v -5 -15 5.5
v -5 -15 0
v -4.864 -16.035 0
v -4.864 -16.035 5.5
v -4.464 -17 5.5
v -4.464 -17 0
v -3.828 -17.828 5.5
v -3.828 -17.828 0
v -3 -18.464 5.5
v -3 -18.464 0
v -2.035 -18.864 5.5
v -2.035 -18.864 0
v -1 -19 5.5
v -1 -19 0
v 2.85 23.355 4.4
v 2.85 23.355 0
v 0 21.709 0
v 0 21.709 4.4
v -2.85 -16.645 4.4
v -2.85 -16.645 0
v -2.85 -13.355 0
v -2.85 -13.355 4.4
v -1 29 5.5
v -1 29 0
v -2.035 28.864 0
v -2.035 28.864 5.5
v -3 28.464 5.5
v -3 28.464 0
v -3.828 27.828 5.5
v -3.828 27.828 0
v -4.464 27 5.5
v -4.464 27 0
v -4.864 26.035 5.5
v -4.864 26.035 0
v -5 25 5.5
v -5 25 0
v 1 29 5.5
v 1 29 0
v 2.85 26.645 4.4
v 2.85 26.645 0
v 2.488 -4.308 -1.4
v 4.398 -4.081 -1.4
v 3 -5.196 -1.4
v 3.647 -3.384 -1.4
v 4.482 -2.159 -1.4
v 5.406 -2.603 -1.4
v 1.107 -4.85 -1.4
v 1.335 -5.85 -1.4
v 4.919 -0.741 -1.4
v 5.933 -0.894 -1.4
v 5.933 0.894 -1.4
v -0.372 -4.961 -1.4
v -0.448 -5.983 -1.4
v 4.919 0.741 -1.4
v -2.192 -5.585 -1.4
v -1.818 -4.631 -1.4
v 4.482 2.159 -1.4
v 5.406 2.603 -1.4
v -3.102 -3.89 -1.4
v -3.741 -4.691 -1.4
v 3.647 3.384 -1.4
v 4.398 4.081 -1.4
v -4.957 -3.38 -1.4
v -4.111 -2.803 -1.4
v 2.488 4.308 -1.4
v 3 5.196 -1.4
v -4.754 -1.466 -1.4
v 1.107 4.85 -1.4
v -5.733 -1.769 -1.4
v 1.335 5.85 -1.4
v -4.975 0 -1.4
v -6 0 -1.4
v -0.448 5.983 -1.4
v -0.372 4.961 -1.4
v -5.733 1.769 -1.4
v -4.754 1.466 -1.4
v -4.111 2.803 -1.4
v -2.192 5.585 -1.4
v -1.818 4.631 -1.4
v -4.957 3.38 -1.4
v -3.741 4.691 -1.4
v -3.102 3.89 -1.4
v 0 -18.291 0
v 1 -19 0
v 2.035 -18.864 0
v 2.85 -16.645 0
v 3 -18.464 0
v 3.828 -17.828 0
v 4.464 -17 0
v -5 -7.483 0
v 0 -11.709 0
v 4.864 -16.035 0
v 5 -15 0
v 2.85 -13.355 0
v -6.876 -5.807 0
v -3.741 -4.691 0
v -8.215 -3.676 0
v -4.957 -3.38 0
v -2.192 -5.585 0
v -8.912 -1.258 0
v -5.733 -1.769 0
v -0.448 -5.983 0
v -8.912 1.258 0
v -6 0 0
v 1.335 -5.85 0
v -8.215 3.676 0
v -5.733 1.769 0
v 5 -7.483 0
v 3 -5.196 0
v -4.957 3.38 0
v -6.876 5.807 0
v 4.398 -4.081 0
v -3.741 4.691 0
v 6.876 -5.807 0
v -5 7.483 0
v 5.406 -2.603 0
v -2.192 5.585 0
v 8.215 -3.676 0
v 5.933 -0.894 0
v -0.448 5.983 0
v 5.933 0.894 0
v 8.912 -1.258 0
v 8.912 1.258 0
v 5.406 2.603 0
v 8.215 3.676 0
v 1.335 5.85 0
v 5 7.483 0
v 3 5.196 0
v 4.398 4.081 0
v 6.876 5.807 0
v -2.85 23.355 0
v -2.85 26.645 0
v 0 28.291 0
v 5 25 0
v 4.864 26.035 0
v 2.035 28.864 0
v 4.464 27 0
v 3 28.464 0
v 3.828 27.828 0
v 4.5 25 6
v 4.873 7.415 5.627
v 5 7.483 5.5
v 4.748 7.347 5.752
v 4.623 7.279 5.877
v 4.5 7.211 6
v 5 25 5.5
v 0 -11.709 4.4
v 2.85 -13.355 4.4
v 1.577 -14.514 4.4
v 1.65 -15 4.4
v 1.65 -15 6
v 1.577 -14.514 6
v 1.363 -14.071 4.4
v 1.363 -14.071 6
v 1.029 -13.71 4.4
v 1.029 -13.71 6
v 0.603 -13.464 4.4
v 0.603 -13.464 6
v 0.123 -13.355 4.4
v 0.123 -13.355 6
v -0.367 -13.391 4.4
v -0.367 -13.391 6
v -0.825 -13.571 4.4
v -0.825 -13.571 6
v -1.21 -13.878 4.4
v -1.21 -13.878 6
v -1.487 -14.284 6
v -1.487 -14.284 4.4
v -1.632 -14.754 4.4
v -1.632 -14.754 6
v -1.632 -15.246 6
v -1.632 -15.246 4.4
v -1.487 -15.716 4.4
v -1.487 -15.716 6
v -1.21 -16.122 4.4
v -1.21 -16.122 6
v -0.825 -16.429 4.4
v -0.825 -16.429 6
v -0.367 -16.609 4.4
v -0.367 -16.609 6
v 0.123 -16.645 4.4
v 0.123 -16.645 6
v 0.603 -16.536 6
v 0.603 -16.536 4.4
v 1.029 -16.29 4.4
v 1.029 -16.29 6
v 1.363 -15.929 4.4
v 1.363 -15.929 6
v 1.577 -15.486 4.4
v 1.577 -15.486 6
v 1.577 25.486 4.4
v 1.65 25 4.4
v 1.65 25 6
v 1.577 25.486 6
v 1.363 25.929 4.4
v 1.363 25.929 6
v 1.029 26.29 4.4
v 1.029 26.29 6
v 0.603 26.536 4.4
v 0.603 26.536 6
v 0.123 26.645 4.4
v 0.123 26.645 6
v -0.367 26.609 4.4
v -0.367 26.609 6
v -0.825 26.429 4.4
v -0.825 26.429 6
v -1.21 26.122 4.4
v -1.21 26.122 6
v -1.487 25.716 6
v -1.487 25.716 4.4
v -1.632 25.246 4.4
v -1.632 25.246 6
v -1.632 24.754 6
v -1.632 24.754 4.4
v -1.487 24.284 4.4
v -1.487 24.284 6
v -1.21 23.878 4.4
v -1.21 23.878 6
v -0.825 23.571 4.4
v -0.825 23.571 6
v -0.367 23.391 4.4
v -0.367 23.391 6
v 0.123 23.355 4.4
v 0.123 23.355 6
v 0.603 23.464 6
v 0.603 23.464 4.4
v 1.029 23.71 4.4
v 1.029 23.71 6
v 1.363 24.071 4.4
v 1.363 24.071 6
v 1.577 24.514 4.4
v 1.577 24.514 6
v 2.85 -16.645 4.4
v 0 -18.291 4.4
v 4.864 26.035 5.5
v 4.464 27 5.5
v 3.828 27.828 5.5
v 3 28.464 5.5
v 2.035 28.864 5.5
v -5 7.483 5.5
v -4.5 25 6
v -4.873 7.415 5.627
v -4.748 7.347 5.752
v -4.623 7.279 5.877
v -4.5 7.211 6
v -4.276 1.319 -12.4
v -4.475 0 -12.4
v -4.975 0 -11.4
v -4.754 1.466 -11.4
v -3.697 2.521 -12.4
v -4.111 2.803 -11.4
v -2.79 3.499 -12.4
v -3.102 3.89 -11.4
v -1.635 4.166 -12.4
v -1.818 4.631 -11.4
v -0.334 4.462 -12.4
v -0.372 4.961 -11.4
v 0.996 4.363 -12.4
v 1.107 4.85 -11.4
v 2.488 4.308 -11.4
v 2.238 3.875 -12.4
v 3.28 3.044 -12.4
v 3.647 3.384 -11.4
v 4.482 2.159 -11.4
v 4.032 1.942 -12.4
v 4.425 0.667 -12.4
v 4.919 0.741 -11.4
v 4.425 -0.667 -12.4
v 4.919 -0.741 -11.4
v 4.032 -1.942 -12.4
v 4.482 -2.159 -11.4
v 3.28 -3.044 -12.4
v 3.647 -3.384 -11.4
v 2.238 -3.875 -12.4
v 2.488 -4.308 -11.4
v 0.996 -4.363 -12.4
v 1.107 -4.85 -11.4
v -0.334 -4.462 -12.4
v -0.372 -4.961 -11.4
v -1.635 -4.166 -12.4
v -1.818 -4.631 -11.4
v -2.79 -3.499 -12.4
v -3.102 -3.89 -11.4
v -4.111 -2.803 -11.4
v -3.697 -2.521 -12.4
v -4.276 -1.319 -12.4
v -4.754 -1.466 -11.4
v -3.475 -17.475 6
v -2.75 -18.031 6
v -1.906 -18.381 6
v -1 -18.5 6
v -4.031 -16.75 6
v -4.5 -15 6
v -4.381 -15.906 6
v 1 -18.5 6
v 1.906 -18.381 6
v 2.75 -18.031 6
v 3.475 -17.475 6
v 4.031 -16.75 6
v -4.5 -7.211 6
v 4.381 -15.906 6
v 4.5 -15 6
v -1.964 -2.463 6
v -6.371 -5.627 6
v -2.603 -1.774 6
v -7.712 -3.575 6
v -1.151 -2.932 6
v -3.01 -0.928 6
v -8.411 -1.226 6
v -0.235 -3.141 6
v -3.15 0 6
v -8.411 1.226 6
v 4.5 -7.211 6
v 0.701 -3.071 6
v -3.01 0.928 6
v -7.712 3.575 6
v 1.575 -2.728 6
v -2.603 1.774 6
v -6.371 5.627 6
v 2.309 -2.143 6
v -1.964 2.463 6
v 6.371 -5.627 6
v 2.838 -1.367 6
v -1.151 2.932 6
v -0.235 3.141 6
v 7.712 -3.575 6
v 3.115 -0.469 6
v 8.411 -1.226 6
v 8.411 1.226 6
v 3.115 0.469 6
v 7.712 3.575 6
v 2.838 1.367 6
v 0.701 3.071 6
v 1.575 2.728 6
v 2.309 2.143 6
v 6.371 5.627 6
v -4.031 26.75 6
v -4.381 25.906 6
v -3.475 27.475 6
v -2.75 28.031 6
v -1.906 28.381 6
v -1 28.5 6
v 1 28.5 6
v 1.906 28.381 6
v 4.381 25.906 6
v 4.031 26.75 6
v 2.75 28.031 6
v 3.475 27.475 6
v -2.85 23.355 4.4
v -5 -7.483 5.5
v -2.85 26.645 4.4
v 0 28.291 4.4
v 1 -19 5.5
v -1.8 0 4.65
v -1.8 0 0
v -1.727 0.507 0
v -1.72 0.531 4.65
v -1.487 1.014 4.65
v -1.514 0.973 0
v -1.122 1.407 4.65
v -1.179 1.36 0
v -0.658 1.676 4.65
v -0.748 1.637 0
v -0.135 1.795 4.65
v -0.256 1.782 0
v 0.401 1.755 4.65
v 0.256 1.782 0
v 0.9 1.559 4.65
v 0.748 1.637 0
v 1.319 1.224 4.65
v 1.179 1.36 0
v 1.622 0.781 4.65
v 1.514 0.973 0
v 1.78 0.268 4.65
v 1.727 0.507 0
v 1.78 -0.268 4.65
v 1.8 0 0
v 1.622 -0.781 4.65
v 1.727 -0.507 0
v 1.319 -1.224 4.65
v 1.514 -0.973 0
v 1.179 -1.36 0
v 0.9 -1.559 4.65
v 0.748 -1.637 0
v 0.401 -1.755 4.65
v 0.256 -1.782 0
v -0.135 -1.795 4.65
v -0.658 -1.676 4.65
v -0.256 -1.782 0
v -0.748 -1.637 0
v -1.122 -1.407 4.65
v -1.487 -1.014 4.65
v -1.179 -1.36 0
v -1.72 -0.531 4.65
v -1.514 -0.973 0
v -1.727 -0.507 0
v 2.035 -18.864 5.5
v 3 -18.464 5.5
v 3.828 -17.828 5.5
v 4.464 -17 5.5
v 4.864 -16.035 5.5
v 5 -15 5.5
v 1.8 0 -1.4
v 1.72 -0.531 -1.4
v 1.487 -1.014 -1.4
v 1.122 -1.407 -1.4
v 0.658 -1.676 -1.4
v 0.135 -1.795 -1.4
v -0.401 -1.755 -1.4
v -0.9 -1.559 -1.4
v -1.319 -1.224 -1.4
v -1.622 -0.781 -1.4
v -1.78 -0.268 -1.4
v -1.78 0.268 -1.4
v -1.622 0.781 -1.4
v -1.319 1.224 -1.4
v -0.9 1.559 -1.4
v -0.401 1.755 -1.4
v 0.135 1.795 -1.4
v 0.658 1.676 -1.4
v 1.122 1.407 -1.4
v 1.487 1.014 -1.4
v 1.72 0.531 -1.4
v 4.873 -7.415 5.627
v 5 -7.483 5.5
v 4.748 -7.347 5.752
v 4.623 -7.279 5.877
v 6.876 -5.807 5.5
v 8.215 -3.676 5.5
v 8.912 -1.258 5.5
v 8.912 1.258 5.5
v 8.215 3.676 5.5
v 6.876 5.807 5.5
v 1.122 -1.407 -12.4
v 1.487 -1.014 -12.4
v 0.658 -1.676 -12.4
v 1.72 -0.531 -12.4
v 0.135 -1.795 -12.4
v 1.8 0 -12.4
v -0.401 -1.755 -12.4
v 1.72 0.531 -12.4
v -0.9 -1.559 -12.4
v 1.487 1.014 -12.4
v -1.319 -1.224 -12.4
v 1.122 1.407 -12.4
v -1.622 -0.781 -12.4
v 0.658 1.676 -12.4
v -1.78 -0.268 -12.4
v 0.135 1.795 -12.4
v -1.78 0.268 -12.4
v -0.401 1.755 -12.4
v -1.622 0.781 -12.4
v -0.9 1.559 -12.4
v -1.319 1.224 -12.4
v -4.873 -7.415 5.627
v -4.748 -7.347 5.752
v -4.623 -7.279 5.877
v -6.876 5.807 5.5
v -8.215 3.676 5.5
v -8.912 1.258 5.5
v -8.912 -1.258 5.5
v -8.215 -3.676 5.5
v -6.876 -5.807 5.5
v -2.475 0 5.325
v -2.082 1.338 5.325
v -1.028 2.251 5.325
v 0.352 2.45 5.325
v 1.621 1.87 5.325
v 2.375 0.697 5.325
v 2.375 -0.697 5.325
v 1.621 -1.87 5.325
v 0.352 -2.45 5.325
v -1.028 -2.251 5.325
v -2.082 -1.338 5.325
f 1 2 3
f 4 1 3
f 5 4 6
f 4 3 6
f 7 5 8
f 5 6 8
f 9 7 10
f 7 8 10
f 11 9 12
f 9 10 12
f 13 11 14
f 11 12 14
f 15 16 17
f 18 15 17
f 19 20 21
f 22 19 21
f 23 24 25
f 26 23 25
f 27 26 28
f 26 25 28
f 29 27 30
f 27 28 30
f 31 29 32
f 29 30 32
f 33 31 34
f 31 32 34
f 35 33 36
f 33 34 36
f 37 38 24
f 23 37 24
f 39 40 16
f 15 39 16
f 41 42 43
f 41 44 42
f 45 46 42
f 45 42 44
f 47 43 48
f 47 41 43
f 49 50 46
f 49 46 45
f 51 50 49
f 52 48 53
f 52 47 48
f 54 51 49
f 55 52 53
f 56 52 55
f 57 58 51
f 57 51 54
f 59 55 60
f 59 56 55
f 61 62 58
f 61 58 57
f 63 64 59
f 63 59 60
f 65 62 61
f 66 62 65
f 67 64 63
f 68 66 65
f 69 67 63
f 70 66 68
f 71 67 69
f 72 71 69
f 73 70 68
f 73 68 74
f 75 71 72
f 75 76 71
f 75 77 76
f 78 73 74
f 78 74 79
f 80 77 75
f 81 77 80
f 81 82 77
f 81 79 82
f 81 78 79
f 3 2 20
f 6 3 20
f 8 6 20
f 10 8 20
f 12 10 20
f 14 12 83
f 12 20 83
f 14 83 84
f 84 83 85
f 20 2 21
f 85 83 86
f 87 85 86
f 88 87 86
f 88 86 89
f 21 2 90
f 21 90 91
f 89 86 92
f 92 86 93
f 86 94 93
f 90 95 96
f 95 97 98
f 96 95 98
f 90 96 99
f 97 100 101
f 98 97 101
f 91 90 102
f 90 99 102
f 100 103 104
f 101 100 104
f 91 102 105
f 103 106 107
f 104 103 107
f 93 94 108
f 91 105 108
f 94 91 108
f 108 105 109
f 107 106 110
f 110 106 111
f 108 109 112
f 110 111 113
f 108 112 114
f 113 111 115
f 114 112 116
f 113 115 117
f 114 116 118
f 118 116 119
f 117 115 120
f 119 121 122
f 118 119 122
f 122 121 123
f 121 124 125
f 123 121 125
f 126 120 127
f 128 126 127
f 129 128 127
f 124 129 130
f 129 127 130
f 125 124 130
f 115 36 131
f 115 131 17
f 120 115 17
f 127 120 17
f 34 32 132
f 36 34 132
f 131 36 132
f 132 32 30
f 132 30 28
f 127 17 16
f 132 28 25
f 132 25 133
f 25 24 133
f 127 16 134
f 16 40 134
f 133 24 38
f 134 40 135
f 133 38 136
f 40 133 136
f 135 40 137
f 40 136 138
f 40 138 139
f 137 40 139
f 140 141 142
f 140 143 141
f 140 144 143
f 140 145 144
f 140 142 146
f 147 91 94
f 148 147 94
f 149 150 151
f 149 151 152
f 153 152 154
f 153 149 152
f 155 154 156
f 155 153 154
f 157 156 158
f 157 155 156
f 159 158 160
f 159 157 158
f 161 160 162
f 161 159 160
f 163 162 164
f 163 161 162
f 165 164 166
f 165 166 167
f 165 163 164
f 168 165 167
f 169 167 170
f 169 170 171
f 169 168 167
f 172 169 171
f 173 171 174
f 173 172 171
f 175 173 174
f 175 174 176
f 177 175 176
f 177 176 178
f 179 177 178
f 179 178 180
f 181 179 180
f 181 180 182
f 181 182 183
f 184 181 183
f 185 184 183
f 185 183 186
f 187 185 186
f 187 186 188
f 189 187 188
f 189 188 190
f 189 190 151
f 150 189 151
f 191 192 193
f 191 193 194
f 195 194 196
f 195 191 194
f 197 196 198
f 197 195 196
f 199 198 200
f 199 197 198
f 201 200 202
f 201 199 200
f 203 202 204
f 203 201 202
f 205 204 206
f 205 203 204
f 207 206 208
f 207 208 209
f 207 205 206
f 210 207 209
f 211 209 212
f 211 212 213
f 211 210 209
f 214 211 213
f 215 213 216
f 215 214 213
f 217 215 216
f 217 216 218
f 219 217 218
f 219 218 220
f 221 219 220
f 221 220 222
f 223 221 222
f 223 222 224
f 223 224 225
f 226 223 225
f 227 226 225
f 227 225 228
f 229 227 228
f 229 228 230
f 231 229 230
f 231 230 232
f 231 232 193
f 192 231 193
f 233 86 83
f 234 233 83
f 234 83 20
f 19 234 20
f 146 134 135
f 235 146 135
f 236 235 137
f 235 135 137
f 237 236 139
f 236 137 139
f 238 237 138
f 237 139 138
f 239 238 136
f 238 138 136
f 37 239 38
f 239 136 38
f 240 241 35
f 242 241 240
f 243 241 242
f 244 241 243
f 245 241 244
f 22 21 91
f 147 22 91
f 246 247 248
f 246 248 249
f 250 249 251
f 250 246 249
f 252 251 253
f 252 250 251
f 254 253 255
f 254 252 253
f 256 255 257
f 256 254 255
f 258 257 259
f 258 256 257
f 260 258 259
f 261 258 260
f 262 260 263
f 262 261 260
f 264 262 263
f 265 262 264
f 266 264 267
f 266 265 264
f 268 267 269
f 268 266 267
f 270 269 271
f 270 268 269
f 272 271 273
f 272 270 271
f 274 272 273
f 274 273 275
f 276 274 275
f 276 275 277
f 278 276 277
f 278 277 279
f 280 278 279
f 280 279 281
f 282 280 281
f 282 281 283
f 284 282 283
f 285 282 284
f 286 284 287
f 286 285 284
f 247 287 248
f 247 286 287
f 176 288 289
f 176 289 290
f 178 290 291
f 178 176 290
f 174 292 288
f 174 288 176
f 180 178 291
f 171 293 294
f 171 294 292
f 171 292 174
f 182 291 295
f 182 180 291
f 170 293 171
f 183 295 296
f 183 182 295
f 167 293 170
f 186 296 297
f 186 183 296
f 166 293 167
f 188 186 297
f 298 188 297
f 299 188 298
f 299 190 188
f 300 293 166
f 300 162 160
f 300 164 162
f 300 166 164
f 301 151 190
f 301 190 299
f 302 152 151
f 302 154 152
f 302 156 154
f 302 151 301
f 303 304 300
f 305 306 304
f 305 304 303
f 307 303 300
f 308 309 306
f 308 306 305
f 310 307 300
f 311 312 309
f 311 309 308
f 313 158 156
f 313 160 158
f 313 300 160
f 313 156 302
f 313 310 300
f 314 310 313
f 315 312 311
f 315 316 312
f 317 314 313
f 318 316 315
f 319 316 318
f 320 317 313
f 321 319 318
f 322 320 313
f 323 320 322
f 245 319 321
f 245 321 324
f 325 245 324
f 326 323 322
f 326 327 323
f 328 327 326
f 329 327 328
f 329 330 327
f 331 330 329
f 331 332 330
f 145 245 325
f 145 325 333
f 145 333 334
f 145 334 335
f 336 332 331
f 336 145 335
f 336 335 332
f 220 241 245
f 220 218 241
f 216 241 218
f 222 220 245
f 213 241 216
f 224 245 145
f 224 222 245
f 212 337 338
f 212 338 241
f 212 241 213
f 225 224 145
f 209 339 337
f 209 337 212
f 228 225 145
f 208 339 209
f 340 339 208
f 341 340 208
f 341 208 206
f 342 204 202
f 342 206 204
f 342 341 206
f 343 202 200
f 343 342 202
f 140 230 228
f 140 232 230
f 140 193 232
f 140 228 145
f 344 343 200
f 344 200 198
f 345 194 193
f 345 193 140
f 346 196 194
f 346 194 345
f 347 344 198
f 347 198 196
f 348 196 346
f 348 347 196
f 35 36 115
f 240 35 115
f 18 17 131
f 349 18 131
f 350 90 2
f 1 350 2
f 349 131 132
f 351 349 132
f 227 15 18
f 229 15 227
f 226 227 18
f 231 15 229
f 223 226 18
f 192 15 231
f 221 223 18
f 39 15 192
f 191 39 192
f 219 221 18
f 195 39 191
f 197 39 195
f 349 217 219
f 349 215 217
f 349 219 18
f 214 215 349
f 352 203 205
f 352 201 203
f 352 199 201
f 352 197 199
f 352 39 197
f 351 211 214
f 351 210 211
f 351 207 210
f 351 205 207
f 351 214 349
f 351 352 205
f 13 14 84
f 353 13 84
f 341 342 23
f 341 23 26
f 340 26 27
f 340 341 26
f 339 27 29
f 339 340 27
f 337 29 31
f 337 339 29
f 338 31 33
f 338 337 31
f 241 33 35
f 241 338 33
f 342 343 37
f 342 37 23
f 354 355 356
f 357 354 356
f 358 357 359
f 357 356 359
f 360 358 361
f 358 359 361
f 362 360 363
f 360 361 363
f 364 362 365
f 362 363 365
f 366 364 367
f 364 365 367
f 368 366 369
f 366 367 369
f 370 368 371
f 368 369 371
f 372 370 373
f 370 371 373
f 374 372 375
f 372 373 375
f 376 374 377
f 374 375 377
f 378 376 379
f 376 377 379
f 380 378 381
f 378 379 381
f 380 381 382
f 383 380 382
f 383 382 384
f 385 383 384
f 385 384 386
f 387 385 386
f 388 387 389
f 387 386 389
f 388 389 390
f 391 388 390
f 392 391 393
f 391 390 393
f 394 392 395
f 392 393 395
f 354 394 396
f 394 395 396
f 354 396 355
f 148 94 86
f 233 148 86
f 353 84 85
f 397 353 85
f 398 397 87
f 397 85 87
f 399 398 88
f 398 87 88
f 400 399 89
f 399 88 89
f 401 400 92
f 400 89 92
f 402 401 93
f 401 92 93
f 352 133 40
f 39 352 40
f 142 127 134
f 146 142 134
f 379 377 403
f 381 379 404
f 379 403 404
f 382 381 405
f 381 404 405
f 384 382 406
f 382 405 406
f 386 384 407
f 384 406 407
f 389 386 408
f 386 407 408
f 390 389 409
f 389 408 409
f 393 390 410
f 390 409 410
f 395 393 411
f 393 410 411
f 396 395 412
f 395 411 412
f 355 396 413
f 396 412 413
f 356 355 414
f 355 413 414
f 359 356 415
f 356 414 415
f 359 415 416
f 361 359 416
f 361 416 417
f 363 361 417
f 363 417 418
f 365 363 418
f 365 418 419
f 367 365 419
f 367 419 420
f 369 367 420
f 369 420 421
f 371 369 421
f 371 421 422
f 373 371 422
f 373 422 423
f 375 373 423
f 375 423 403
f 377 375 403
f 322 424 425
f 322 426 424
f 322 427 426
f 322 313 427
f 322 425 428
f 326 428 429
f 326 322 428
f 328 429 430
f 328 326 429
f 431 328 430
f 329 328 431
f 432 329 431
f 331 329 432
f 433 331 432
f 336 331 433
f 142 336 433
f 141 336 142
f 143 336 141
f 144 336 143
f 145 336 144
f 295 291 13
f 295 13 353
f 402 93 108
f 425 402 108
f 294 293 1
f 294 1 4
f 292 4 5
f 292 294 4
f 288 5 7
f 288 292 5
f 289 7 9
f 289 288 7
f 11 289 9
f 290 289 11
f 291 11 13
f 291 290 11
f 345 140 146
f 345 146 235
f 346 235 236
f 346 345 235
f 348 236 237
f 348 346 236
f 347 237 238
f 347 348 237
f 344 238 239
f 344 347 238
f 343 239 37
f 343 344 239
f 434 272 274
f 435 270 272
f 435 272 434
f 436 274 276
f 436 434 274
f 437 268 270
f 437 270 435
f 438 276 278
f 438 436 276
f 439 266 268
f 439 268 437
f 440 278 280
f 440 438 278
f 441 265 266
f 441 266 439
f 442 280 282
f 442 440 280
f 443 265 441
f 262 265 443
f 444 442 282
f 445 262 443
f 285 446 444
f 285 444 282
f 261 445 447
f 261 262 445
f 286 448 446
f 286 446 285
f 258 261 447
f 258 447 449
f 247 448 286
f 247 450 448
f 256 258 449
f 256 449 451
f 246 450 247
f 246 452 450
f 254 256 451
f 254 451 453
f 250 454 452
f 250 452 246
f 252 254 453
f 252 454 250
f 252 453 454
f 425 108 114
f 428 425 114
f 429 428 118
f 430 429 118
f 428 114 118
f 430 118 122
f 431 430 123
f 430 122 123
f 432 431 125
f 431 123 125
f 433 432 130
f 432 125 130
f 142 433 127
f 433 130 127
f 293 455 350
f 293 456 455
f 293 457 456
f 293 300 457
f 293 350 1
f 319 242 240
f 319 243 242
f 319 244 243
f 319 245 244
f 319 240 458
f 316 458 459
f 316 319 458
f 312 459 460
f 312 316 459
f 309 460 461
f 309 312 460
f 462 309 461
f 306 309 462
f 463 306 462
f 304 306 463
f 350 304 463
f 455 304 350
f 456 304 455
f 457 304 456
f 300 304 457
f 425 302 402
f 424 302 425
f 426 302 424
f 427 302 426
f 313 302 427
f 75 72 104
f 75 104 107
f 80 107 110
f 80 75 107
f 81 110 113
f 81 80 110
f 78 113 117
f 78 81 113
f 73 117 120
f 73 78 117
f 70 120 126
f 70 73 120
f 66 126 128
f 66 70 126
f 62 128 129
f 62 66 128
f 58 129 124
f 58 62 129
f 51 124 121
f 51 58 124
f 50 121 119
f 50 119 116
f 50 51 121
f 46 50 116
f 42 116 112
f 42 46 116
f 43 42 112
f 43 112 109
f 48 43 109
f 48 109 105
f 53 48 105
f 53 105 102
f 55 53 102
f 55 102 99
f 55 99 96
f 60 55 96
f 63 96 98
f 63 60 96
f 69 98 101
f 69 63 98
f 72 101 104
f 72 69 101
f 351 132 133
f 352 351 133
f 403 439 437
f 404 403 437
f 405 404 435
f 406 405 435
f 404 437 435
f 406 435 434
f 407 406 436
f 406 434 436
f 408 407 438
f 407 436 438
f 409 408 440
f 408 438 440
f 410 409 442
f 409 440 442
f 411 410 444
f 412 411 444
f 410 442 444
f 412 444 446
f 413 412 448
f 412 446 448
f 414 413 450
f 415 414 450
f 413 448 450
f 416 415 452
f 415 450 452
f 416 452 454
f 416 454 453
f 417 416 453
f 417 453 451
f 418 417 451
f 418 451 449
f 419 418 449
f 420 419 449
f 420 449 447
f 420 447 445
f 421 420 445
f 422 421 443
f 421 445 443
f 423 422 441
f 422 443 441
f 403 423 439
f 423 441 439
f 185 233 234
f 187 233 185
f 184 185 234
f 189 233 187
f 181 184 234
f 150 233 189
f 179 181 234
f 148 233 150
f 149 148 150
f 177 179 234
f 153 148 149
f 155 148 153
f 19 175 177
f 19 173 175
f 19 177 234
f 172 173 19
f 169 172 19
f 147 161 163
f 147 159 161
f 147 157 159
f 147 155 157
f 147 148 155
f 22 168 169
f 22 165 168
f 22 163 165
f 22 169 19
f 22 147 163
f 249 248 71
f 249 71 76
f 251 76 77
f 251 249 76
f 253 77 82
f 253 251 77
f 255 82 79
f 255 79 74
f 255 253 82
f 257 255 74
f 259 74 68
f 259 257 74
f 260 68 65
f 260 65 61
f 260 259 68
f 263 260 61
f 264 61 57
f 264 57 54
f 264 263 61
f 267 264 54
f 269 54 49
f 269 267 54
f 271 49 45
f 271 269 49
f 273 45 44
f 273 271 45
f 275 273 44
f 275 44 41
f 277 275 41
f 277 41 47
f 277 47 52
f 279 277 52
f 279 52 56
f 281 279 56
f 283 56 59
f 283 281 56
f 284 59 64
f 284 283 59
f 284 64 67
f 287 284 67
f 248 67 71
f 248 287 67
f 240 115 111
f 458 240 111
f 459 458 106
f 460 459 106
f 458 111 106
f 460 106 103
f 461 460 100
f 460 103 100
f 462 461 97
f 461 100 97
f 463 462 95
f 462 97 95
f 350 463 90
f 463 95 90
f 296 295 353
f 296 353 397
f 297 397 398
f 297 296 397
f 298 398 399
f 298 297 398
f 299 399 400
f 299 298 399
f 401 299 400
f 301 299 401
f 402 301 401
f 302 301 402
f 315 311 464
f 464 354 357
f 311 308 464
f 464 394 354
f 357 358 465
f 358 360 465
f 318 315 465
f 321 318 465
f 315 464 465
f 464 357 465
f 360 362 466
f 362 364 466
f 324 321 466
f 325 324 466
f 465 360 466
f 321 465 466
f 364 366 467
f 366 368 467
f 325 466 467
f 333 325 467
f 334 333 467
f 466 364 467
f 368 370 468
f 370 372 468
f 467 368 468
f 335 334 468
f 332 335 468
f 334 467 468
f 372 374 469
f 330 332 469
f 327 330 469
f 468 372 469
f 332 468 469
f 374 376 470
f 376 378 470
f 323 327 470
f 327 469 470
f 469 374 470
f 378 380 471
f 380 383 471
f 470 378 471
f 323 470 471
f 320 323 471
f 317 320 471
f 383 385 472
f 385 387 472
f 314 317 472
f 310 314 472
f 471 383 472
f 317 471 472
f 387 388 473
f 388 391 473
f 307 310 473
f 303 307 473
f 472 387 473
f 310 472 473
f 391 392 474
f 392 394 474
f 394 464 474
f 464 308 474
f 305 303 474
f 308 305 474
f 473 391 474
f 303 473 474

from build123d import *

# Parameters (mm, degrees)
SKETCH1_R                                           = 1.65
SKETCH1_R_2                                         = 1.75
BOSS_EXTRUDE1_DEPTH                                 = 6
CSK_FOR_M3_COUNTERSUNK_FLAT_HEAD_SCREW1_D           = 3.6
CSK_FOR_M3_COUNTERSUNK_FLAT_HEAD_SCREW1_DEPTH       = 47
CSK_FOR_M3_COUNTERSUNK_FLAT_HEAD_SCREW1_CSINK_D     = 6.3
CSK_FOR_M3_COUNTERSUNK_FLAT_HEAD_SCREW1_CSINK_ANGLE = 90
CSK_FOR_M3_COUNTERSUNK_FLAT_HEAD_SCREW1_TIP         = 1.081549114
BOSS_EXTRUDE2_DEPTH                                 = 6
BOSS_EXTRUDE3_START                                 = 1.4
SKETCH5_R                                           = 6
SKETCH5_R_2                                         = 1.8
BOSS_EXTRUDE3_DEPTH                                 = 1.4
BOSS_EXTRUDE4_START                                 = 11
SKETCH6_R                                           = 4.975
SKETCH6_R_2                                         = 1.8
BOSS_EXTRUDE4_DEPTH                                 = 11
CHAMFER1_SIZE                                       = 1
CHAMFER1_SIZE2                                      = 0.5
CUT_EXTRUDE4_DEPTH                                  = 4.4
CHAMFER2_SIZE                                       = 0.5


with BuildPart() as part:
    # Sketch1 → Boss-Extrude1 (new body)
    with BuildSketch(Plane.XY):
        with BuildLine():
            Line((5, 7.483314774), (5, 25))
            ThreePointArc((5, 25), (3.828427125, 27.828427125), (1, 29))
            Line((1, 29), (-1, 29))
            ThreePointArc((-1, 29), (-3.828427125, 27.828427125), (-5, 25))
            Line((-5, 25), (-5, 7.483314774))
            ThreePointArc((-5, 7.483314774), (-9, 0), (-5, -7.483314774))
            Line((-5, -7.483314774), (-5, -15))
            ThreePointArc((-5, -15), (-3.828427125, -17.828427125), (-1, -19))
            Line((-1, -19), (1, -19))
            ThreePointArc((1, -19), (3.828427125, -17.828427125), (5, -15))
            Line((5, -15), (5, -7.483314774))
            ThreePointArc((5, -7.483314774), (9, 0), (5, 7.483314774))
        make_face()
        with Locations((0, 25)):
            Circle(SKETCH1_R, mode=Mode.SUBTRACT)
        with BuildLine():
            Line((-6.988562084, -0.4), (-3.979949748, -0.4))
            ThreePointArc((-3.979949748, -0.4), (-3.464101615, -2), (-2.336385036, -3.246737588))
            Line((-2.336385036, -3.246737588), (-3.840691203, -5.852272301))
            ThreePointArc((-3.840691203, -5.852272301), (-6.062177826, -3.5), (-6.988562084, -0.4))
        make_face(mode=Mode.SUBTRACT)
        with BuildLine():
            ThreePointArc((-1.643564713, -3.646737588), (0, -4), (1.643564713, -3.646737588))
            Line((1.643564713, -3.646737588), (3.14787088, -6.252272301))
            ThreePointArc((3.14787088, -6.252272301), (0, -7), (-3.14787088, -6.252272301))
            Line((-3.14787088, -6.252272301), (-1.643564713, -3.646737588))
        make_face(mode=Mode.SUBTRACT)
        with BuildLine():
            ThreePointArc((2.336385036, -3.246737588), (3.464101615, -2), (3.979949748, -0.4))
            Line((3.979949748, -0.4), (6.988562084, -0.4))
            ThreePointArc((6.988562084, -0.4), (6.062177826, -3.5), (3.840691203, -5.852272301))
            Line((3.840691203, -5.852272301), (2.336385036, -3.246737588))
        make_face(mode=Mode.SUBTRACT)
        with BuildLine():
            ThreePointArc((3.979949748, 0.4), (3.464101615, 2), (2.336385036, 3.246737588))
            Line((2.336385036, 3.246737588), (3.840691203, 5.852272301))
            ThreePointArc((3.840691203, 5.852272301), (6.062177826, 3.5), (6.988562084, 0.4))
            Line((6.988562084, 0.4), (3.979949748, 0.4))
        make_face(mode=Mode.SUBTRACT)
        with BuildLine():
            ThreePointArc((1.643564713, 3.646737588), (0, 4), (-1.643564713, 3.646737588))
            Line((-1.643564713, 3.646737588), (-3.14787088, 6.252272301))
            ThreePointArc((-3.14787088, 6.252272301), (0, 7), (3.14787088, 6.252272301))
            Line((3.14787088, 6.252272301), (1.643564713, 3.646737588))
        make_face(mode=Mode.SUBTRACT)
        with BuildLine():
            ThreePointArc((-2.336385036, 3.246737588), (-3.464101615, 2), (-3.979949748, 0.4))
            Line((-3.979949748, 0.4), (-6.988562084, 0.4))
            ThreePointArc((-6.988562084, 0.4), (-6.062177826, 3.5), (-3.840691203, 5.852272301))
            Line((-3.840691203, 5.852272301), (-2.336385036, 3.246737588))
        make_face(mode=Mode.SUBTRACT)
        with Locations((0, -15)):
            Circle(SKETCH1_R, mode=Mode.SUBTRACT)
        Circle(SKETCH1_R_2, mode=Mode.SUBTRACT)
    extrude(amount=BOSS_EXTRUDE1_DEPTH)

    # CSK for M3 Countersunk Flat Head Screw1
    with Locations(Plane.XY.offset(6)):
        with Locations((0, 0)):
            CounterSinkHole(CSK_FOR_M3_COUNTERSUNK_FLAT_HEAD_SCREW1_D / 2, CSK_FOR_M3_COUNTERSUNK_FLAT_HEAD_SCREW1_CSINK_D / 2, depth=CSK_FOR_M3_COUNTERSUNK_FLAT_HEAD_SCREW1_DEPTH, counter_sink_angle=CSK_FOR_M3_COUNTERSUNK_FLAT_HEAD_SCREW1_CSINK_ANGLE)
            with Locations((0, 0, -(CSK_FOR_M3_COUNTERSUNK_FLAT_HEAD_SCREW1_DEPTH + CSK_FOR_M3_COUNTERSUNK_FLAT_HEAD_SCREW1_TIP / 2))):  # 118° drill point
                Cone(0, CSK_FOR_M3_COUNTERSUNK_FLAT_HEAD_SCREW1_D / 2, CSK_FOR_M3_COUNTERSUNK_FLAT_HEAD_SCREW1_TIP, mode=Mode.SUBTRACT)

    # Sketch1<5> → Boss-Extrude2 (add)
    with BuildSketch(Plane.XY):
        with BuildLine():
            Line((3.640691203, 5.505862139), (2.336385036, 3.246737588))
            ThreePointArc((2.336385036, 3.246737588), (3.464101615, 2), (3.979949748, 0.4))
            Line((3.979949748, 0.4), (6.988562084, 0.4))
            ThreePointArc((6.988562084, 0.4), (6.062177826, 3.5), (3.840691203, 5.852272301))
            Line((3.840691203, 5.852272301), (3.640691203, 5.505862139))
        make_face()
        with BuildLine():
            Line((-2.94787088, 5.905862139), (-1.643564713, 3.646737588))
            ThreePointArc((-1.643564713, 3.646737588), (0, 4), (1.643564713, 3.646737588))
            Line((1.643564713, 3.646737588), (3.14787088, 6.252272301))
            ThreePointArc((3.14787088, 6.252272301), (0, 7), (-3.14787088, 6.252272301))
            Line((-3.14787088, 6.252272301), (-2.94787088, 5.905862139))
        make_face()
        with BuildLine():
            ThreePointArc((-2.336385036, -3.246737588), (-3.464101615, -2), (-3.979949748, -0.4))
            Line((-3.979949748, -0.4), (-6.988562084, -0.4))
            ThreePointArc((-6.988562084, -0.4), (-6.062177826, -3.5), (-3.840691203, -5.852272301))
            Line((-3.840691203, -5.852272301), (-3.640691203, -5.505862139))
            Line((-3.640691203, -5.505862139), (-2.336385036, -3.246737588))
        make_face()
        with BuildLine():
            Line((-6.588562084, 0.4), (-3.979949748, 0.4))
            ThreePointArc((-3.979949748, 0.4), (-3.464101615, 2), (-2.336385036, 3.246737588))
            Line((-2.336385036, 3.246737588), (-3.840691203, 5.852272301))
            ThreePointArc((-3.840691203, 5.852272301), (-6.062177826, 3.5), (-6.988562084, 0.4))
            Line((-6.988562084, 0.4), (-6.588562084, 0.4))
        make_face()
        with BuildLine():
            ThreePointArc((3.979949748, -0.4), (3.464101615, -2), (2.336385036, -3.246737588))
            Line((2.336385036, -3.246737588), (3.840691203, -5.852272301))
            ThreePointArc((3.840691203, -5.852272301), (6.062177826, -3.5), (6.988562084, -0.4))
            Line((6.988562084, -0.4), (6.588562084, -0.4))
            Line((6.588562084, -0.4), (3.979949748, -0.4))
        make_face()
        with BuildLine():
            ThreePointArc((1.643564713, -3.646737588), (0, -4), (-1.643564713, -3.646737588))
            Line((-1.643564713, -3.646737588), (-3.14787088, -6.252272301))
            ThreePointArc((-3.14787088, -6.252272301), (0, -7), (3.14787088, -6.252272301))
            Line((3.14787088, -6.252272301), (2.94787088, -5.905862139))
            Line((2.94787088, -5.905862139), (1.643564713, -3.646737588))
        make_face()
    extrude(amount=BOSS_EXTRUDE2_DEPTH)

    # Sketch5 → Boss-Extrude3 (add)
    with BuildSketch(Plane(origin=(0, 0, 0), x_dir=(-1, 0, 0), z_dir=(0, 0, -1)).offset(BOSS_EXTRUDE3_START)):
        Circle(SKETCH5_R)
        with Locations(Location((0, 0, 0), (0, 0, 180))):
            Circle(SKETCH5_R_2, mode=Mode.SUBTRACT)
    extrude(amount=-BOSS_EXTRUDE3_DEPTH)

    # Sketch6 → Boss-Extrude4 (add)
    with BuildSketch(Plane(origin=(0, 0, -1.4), x_dir=(-1, 0, 0), z_dir=(0, 0, -1)).offset(BOSS_EXTRUDE4_START)):
        Circle(SKETCH6_R)
        with Locations(Location((0, 0, 0), (0, 0, 180))):
            Circle(SKETCH6_R_2, mode=Mode.SUBTRACT)
    extrude(amount=-BOSS_EXTRUDE4_DEPTH)

    # Chamfer1
    chamfer1_edges = [part.edges().sort_by_distance(p)[0] for p in [
        (4.975, 0, -12.4),
    ]]
    chamfer1_side = [part.faces().sort_by_distance(p)[0] for p in [
        (4.975, 0, -6.9),
    ]]
    chamfer(chamfer1_edges, length=CHAMFER1_SIZE, length2=CHAMFER1_SIZE2, reference=chamfer1_side[0])

    # Sketch7 → Cut-Extrude4 (cut)
    with BuildSketch(Plane(origin=(0, 0, 0), x_dir=(-1, 0, 0), z_dir=(0, 0, -1))):
        Polygon((2.85, 23.354551733), (2.85, 26.645448267), (0, 28.290896534), (-2.85, 26.645448267), (-2.85, 23.354551733), (0, 21.709103466), align=None)
        Polygon((2.85, -13.354551733), (0, -11.709103466), (-2.85, -13.354551733), (-2.85, -16.645448267), (0, -18.290896534), (2.85, -16.645448267), align=None)
    extrude(amount=-CUT_EXTRUDE4_DEPTH, mode=Mode.SUBTRACT)

    # Chamfer2
    chamfer2_edges = [part.edges().sort_by_distance(p)[0] for p in [
        (-5, -11.241657387, 6),
        (-3.828427125, -17.828427125, 6),
        (0, -19, 6),
        (3.828427125, -17.828427125, 6),
        (5, -11.241657387, 6),
        (9, 0, 6),
        (5, 16.241657387, 6),
        (3.828427125, 27.828427125, 6),
        (0, 29, 6),
        (-3.828427125, 27.828427125, 6),
        (-5, 16.241657387, 6),
        (-9, 0, 6),
    ]]
    chamfer(chamfer2_edges, length=CHAMFER2_SIZE)


solid = part.part
